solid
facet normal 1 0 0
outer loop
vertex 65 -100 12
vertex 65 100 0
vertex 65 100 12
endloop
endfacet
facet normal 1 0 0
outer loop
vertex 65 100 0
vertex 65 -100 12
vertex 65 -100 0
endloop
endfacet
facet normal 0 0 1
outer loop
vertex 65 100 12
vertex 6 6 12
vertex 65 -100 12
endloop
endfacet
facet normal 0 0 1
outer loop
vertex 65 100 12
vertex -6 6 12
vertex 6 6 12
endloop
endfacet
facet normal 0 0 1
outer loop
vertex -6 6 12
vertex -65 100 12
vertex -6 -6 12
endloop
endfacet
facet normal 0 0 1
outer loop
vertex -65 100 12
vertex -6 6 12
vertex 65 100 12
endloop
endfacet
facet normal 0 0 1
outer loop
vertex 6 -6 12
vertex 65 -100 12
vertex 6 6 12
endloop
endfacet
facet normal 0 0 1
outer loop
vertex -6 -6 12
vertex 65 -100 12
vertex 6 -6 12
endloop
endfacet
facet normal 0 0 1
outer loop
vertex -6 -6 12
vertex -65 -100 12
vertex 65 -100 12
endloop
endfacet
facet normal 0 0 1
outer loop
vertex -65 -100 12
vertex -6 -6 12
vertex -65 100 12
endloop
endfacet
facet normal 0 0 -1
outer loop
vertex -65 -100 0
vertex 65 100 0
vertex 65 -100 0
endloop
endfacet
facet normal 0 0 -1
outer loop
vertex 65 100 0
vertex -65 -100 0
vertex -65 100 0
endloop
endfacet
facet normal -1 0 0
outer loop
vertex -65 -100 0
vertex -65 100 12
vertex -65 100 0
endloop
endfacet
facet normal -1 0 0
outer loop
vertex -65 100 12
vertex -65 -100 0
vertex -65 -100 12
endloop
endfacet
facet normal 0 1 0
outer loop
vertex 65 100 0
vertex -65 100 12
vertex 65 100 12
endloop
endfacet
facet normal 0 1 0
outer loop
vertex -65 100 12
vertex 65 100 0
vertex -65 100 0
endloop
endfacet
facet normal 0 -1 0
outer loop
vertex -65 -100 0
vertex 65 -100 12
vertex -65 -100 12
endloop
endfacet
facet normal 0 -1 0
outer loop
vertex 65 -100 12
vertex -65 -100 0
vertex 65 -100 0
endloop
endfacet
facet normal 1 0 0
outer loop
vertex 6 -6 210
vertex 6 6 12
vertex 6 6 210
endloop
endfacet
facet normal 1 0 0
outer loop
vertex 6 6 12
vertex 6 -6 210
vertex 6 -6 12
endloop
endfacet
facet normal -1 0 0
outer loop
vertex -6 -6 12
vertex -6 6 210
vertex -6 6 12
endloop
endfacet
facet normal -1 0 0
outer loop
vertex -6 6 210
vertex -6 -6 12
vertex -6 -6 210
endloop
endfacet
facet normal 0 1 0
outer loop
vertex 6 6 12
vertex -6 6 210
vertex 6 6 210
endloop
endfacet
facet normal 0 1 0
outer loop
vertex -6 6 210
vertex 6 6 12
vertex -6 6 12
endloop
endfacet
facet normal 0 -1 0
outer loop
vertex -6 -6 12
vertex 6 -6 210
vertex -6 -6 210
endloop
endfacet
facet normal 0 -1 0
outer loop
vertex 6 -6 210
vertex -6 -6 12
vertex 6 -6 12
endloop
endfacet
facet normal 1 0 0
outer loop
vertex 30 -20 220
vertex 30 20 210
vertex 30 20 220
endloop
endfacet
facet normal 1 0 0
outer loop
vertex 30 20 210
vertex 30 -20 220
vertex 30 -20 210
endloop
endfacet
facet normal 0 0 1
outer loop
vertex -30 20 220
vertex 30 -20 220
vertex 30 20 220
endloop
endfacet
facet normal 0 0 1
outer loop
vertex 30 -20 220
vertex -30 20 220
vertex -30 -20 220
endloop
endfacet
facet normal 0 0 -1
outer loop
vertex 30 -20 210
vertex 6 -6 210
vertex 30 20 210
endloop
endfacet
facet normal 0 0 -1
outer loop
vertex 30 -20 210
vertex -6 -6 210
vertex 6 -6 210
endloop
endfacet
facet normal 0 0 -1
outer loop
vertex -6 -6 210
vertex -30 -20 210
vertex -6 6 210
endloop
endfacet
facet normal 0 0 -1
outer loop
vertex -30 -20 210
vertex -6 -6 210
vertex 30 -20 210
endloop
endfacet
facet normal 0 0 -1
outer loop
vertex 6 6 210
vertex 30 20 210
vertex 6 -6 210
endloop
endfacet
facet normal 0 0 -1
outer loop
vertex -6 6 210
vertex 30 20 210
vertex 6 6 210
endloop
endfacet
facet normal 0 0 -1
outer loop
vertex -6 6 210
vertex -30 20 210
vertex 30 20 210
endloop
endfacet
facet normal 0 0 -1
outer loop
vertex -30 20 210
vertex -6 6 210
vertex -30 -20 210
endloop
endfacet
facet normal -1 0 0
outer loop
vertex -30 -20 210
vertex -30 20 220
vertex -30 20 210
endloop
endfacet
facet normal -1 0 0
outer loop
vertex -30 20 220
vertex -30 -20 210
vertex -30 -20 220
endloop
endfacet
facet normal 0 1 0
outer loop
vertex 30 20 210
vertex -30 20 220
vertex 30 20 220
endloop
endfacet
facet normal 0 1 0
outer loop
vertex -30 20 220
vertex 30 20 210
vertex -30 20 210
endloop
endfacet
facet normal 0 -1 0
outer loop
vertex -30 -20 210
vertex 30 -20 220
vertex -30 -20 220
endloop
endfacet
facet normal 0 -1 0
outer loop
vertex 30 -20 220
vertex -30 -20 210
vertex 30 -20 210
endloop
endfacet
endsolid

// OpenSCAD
// Ordinary T-shaped headphone stand, millimetres; original MIT geometry.
$fn=48;
union(){
 translate([0,0,6])cube([130,200,12],center=true);
 translate([0,0,114.5])cube([12,12,205],center=true);
 translate([0,0,215])cube([60,40,10],center=true);
}
